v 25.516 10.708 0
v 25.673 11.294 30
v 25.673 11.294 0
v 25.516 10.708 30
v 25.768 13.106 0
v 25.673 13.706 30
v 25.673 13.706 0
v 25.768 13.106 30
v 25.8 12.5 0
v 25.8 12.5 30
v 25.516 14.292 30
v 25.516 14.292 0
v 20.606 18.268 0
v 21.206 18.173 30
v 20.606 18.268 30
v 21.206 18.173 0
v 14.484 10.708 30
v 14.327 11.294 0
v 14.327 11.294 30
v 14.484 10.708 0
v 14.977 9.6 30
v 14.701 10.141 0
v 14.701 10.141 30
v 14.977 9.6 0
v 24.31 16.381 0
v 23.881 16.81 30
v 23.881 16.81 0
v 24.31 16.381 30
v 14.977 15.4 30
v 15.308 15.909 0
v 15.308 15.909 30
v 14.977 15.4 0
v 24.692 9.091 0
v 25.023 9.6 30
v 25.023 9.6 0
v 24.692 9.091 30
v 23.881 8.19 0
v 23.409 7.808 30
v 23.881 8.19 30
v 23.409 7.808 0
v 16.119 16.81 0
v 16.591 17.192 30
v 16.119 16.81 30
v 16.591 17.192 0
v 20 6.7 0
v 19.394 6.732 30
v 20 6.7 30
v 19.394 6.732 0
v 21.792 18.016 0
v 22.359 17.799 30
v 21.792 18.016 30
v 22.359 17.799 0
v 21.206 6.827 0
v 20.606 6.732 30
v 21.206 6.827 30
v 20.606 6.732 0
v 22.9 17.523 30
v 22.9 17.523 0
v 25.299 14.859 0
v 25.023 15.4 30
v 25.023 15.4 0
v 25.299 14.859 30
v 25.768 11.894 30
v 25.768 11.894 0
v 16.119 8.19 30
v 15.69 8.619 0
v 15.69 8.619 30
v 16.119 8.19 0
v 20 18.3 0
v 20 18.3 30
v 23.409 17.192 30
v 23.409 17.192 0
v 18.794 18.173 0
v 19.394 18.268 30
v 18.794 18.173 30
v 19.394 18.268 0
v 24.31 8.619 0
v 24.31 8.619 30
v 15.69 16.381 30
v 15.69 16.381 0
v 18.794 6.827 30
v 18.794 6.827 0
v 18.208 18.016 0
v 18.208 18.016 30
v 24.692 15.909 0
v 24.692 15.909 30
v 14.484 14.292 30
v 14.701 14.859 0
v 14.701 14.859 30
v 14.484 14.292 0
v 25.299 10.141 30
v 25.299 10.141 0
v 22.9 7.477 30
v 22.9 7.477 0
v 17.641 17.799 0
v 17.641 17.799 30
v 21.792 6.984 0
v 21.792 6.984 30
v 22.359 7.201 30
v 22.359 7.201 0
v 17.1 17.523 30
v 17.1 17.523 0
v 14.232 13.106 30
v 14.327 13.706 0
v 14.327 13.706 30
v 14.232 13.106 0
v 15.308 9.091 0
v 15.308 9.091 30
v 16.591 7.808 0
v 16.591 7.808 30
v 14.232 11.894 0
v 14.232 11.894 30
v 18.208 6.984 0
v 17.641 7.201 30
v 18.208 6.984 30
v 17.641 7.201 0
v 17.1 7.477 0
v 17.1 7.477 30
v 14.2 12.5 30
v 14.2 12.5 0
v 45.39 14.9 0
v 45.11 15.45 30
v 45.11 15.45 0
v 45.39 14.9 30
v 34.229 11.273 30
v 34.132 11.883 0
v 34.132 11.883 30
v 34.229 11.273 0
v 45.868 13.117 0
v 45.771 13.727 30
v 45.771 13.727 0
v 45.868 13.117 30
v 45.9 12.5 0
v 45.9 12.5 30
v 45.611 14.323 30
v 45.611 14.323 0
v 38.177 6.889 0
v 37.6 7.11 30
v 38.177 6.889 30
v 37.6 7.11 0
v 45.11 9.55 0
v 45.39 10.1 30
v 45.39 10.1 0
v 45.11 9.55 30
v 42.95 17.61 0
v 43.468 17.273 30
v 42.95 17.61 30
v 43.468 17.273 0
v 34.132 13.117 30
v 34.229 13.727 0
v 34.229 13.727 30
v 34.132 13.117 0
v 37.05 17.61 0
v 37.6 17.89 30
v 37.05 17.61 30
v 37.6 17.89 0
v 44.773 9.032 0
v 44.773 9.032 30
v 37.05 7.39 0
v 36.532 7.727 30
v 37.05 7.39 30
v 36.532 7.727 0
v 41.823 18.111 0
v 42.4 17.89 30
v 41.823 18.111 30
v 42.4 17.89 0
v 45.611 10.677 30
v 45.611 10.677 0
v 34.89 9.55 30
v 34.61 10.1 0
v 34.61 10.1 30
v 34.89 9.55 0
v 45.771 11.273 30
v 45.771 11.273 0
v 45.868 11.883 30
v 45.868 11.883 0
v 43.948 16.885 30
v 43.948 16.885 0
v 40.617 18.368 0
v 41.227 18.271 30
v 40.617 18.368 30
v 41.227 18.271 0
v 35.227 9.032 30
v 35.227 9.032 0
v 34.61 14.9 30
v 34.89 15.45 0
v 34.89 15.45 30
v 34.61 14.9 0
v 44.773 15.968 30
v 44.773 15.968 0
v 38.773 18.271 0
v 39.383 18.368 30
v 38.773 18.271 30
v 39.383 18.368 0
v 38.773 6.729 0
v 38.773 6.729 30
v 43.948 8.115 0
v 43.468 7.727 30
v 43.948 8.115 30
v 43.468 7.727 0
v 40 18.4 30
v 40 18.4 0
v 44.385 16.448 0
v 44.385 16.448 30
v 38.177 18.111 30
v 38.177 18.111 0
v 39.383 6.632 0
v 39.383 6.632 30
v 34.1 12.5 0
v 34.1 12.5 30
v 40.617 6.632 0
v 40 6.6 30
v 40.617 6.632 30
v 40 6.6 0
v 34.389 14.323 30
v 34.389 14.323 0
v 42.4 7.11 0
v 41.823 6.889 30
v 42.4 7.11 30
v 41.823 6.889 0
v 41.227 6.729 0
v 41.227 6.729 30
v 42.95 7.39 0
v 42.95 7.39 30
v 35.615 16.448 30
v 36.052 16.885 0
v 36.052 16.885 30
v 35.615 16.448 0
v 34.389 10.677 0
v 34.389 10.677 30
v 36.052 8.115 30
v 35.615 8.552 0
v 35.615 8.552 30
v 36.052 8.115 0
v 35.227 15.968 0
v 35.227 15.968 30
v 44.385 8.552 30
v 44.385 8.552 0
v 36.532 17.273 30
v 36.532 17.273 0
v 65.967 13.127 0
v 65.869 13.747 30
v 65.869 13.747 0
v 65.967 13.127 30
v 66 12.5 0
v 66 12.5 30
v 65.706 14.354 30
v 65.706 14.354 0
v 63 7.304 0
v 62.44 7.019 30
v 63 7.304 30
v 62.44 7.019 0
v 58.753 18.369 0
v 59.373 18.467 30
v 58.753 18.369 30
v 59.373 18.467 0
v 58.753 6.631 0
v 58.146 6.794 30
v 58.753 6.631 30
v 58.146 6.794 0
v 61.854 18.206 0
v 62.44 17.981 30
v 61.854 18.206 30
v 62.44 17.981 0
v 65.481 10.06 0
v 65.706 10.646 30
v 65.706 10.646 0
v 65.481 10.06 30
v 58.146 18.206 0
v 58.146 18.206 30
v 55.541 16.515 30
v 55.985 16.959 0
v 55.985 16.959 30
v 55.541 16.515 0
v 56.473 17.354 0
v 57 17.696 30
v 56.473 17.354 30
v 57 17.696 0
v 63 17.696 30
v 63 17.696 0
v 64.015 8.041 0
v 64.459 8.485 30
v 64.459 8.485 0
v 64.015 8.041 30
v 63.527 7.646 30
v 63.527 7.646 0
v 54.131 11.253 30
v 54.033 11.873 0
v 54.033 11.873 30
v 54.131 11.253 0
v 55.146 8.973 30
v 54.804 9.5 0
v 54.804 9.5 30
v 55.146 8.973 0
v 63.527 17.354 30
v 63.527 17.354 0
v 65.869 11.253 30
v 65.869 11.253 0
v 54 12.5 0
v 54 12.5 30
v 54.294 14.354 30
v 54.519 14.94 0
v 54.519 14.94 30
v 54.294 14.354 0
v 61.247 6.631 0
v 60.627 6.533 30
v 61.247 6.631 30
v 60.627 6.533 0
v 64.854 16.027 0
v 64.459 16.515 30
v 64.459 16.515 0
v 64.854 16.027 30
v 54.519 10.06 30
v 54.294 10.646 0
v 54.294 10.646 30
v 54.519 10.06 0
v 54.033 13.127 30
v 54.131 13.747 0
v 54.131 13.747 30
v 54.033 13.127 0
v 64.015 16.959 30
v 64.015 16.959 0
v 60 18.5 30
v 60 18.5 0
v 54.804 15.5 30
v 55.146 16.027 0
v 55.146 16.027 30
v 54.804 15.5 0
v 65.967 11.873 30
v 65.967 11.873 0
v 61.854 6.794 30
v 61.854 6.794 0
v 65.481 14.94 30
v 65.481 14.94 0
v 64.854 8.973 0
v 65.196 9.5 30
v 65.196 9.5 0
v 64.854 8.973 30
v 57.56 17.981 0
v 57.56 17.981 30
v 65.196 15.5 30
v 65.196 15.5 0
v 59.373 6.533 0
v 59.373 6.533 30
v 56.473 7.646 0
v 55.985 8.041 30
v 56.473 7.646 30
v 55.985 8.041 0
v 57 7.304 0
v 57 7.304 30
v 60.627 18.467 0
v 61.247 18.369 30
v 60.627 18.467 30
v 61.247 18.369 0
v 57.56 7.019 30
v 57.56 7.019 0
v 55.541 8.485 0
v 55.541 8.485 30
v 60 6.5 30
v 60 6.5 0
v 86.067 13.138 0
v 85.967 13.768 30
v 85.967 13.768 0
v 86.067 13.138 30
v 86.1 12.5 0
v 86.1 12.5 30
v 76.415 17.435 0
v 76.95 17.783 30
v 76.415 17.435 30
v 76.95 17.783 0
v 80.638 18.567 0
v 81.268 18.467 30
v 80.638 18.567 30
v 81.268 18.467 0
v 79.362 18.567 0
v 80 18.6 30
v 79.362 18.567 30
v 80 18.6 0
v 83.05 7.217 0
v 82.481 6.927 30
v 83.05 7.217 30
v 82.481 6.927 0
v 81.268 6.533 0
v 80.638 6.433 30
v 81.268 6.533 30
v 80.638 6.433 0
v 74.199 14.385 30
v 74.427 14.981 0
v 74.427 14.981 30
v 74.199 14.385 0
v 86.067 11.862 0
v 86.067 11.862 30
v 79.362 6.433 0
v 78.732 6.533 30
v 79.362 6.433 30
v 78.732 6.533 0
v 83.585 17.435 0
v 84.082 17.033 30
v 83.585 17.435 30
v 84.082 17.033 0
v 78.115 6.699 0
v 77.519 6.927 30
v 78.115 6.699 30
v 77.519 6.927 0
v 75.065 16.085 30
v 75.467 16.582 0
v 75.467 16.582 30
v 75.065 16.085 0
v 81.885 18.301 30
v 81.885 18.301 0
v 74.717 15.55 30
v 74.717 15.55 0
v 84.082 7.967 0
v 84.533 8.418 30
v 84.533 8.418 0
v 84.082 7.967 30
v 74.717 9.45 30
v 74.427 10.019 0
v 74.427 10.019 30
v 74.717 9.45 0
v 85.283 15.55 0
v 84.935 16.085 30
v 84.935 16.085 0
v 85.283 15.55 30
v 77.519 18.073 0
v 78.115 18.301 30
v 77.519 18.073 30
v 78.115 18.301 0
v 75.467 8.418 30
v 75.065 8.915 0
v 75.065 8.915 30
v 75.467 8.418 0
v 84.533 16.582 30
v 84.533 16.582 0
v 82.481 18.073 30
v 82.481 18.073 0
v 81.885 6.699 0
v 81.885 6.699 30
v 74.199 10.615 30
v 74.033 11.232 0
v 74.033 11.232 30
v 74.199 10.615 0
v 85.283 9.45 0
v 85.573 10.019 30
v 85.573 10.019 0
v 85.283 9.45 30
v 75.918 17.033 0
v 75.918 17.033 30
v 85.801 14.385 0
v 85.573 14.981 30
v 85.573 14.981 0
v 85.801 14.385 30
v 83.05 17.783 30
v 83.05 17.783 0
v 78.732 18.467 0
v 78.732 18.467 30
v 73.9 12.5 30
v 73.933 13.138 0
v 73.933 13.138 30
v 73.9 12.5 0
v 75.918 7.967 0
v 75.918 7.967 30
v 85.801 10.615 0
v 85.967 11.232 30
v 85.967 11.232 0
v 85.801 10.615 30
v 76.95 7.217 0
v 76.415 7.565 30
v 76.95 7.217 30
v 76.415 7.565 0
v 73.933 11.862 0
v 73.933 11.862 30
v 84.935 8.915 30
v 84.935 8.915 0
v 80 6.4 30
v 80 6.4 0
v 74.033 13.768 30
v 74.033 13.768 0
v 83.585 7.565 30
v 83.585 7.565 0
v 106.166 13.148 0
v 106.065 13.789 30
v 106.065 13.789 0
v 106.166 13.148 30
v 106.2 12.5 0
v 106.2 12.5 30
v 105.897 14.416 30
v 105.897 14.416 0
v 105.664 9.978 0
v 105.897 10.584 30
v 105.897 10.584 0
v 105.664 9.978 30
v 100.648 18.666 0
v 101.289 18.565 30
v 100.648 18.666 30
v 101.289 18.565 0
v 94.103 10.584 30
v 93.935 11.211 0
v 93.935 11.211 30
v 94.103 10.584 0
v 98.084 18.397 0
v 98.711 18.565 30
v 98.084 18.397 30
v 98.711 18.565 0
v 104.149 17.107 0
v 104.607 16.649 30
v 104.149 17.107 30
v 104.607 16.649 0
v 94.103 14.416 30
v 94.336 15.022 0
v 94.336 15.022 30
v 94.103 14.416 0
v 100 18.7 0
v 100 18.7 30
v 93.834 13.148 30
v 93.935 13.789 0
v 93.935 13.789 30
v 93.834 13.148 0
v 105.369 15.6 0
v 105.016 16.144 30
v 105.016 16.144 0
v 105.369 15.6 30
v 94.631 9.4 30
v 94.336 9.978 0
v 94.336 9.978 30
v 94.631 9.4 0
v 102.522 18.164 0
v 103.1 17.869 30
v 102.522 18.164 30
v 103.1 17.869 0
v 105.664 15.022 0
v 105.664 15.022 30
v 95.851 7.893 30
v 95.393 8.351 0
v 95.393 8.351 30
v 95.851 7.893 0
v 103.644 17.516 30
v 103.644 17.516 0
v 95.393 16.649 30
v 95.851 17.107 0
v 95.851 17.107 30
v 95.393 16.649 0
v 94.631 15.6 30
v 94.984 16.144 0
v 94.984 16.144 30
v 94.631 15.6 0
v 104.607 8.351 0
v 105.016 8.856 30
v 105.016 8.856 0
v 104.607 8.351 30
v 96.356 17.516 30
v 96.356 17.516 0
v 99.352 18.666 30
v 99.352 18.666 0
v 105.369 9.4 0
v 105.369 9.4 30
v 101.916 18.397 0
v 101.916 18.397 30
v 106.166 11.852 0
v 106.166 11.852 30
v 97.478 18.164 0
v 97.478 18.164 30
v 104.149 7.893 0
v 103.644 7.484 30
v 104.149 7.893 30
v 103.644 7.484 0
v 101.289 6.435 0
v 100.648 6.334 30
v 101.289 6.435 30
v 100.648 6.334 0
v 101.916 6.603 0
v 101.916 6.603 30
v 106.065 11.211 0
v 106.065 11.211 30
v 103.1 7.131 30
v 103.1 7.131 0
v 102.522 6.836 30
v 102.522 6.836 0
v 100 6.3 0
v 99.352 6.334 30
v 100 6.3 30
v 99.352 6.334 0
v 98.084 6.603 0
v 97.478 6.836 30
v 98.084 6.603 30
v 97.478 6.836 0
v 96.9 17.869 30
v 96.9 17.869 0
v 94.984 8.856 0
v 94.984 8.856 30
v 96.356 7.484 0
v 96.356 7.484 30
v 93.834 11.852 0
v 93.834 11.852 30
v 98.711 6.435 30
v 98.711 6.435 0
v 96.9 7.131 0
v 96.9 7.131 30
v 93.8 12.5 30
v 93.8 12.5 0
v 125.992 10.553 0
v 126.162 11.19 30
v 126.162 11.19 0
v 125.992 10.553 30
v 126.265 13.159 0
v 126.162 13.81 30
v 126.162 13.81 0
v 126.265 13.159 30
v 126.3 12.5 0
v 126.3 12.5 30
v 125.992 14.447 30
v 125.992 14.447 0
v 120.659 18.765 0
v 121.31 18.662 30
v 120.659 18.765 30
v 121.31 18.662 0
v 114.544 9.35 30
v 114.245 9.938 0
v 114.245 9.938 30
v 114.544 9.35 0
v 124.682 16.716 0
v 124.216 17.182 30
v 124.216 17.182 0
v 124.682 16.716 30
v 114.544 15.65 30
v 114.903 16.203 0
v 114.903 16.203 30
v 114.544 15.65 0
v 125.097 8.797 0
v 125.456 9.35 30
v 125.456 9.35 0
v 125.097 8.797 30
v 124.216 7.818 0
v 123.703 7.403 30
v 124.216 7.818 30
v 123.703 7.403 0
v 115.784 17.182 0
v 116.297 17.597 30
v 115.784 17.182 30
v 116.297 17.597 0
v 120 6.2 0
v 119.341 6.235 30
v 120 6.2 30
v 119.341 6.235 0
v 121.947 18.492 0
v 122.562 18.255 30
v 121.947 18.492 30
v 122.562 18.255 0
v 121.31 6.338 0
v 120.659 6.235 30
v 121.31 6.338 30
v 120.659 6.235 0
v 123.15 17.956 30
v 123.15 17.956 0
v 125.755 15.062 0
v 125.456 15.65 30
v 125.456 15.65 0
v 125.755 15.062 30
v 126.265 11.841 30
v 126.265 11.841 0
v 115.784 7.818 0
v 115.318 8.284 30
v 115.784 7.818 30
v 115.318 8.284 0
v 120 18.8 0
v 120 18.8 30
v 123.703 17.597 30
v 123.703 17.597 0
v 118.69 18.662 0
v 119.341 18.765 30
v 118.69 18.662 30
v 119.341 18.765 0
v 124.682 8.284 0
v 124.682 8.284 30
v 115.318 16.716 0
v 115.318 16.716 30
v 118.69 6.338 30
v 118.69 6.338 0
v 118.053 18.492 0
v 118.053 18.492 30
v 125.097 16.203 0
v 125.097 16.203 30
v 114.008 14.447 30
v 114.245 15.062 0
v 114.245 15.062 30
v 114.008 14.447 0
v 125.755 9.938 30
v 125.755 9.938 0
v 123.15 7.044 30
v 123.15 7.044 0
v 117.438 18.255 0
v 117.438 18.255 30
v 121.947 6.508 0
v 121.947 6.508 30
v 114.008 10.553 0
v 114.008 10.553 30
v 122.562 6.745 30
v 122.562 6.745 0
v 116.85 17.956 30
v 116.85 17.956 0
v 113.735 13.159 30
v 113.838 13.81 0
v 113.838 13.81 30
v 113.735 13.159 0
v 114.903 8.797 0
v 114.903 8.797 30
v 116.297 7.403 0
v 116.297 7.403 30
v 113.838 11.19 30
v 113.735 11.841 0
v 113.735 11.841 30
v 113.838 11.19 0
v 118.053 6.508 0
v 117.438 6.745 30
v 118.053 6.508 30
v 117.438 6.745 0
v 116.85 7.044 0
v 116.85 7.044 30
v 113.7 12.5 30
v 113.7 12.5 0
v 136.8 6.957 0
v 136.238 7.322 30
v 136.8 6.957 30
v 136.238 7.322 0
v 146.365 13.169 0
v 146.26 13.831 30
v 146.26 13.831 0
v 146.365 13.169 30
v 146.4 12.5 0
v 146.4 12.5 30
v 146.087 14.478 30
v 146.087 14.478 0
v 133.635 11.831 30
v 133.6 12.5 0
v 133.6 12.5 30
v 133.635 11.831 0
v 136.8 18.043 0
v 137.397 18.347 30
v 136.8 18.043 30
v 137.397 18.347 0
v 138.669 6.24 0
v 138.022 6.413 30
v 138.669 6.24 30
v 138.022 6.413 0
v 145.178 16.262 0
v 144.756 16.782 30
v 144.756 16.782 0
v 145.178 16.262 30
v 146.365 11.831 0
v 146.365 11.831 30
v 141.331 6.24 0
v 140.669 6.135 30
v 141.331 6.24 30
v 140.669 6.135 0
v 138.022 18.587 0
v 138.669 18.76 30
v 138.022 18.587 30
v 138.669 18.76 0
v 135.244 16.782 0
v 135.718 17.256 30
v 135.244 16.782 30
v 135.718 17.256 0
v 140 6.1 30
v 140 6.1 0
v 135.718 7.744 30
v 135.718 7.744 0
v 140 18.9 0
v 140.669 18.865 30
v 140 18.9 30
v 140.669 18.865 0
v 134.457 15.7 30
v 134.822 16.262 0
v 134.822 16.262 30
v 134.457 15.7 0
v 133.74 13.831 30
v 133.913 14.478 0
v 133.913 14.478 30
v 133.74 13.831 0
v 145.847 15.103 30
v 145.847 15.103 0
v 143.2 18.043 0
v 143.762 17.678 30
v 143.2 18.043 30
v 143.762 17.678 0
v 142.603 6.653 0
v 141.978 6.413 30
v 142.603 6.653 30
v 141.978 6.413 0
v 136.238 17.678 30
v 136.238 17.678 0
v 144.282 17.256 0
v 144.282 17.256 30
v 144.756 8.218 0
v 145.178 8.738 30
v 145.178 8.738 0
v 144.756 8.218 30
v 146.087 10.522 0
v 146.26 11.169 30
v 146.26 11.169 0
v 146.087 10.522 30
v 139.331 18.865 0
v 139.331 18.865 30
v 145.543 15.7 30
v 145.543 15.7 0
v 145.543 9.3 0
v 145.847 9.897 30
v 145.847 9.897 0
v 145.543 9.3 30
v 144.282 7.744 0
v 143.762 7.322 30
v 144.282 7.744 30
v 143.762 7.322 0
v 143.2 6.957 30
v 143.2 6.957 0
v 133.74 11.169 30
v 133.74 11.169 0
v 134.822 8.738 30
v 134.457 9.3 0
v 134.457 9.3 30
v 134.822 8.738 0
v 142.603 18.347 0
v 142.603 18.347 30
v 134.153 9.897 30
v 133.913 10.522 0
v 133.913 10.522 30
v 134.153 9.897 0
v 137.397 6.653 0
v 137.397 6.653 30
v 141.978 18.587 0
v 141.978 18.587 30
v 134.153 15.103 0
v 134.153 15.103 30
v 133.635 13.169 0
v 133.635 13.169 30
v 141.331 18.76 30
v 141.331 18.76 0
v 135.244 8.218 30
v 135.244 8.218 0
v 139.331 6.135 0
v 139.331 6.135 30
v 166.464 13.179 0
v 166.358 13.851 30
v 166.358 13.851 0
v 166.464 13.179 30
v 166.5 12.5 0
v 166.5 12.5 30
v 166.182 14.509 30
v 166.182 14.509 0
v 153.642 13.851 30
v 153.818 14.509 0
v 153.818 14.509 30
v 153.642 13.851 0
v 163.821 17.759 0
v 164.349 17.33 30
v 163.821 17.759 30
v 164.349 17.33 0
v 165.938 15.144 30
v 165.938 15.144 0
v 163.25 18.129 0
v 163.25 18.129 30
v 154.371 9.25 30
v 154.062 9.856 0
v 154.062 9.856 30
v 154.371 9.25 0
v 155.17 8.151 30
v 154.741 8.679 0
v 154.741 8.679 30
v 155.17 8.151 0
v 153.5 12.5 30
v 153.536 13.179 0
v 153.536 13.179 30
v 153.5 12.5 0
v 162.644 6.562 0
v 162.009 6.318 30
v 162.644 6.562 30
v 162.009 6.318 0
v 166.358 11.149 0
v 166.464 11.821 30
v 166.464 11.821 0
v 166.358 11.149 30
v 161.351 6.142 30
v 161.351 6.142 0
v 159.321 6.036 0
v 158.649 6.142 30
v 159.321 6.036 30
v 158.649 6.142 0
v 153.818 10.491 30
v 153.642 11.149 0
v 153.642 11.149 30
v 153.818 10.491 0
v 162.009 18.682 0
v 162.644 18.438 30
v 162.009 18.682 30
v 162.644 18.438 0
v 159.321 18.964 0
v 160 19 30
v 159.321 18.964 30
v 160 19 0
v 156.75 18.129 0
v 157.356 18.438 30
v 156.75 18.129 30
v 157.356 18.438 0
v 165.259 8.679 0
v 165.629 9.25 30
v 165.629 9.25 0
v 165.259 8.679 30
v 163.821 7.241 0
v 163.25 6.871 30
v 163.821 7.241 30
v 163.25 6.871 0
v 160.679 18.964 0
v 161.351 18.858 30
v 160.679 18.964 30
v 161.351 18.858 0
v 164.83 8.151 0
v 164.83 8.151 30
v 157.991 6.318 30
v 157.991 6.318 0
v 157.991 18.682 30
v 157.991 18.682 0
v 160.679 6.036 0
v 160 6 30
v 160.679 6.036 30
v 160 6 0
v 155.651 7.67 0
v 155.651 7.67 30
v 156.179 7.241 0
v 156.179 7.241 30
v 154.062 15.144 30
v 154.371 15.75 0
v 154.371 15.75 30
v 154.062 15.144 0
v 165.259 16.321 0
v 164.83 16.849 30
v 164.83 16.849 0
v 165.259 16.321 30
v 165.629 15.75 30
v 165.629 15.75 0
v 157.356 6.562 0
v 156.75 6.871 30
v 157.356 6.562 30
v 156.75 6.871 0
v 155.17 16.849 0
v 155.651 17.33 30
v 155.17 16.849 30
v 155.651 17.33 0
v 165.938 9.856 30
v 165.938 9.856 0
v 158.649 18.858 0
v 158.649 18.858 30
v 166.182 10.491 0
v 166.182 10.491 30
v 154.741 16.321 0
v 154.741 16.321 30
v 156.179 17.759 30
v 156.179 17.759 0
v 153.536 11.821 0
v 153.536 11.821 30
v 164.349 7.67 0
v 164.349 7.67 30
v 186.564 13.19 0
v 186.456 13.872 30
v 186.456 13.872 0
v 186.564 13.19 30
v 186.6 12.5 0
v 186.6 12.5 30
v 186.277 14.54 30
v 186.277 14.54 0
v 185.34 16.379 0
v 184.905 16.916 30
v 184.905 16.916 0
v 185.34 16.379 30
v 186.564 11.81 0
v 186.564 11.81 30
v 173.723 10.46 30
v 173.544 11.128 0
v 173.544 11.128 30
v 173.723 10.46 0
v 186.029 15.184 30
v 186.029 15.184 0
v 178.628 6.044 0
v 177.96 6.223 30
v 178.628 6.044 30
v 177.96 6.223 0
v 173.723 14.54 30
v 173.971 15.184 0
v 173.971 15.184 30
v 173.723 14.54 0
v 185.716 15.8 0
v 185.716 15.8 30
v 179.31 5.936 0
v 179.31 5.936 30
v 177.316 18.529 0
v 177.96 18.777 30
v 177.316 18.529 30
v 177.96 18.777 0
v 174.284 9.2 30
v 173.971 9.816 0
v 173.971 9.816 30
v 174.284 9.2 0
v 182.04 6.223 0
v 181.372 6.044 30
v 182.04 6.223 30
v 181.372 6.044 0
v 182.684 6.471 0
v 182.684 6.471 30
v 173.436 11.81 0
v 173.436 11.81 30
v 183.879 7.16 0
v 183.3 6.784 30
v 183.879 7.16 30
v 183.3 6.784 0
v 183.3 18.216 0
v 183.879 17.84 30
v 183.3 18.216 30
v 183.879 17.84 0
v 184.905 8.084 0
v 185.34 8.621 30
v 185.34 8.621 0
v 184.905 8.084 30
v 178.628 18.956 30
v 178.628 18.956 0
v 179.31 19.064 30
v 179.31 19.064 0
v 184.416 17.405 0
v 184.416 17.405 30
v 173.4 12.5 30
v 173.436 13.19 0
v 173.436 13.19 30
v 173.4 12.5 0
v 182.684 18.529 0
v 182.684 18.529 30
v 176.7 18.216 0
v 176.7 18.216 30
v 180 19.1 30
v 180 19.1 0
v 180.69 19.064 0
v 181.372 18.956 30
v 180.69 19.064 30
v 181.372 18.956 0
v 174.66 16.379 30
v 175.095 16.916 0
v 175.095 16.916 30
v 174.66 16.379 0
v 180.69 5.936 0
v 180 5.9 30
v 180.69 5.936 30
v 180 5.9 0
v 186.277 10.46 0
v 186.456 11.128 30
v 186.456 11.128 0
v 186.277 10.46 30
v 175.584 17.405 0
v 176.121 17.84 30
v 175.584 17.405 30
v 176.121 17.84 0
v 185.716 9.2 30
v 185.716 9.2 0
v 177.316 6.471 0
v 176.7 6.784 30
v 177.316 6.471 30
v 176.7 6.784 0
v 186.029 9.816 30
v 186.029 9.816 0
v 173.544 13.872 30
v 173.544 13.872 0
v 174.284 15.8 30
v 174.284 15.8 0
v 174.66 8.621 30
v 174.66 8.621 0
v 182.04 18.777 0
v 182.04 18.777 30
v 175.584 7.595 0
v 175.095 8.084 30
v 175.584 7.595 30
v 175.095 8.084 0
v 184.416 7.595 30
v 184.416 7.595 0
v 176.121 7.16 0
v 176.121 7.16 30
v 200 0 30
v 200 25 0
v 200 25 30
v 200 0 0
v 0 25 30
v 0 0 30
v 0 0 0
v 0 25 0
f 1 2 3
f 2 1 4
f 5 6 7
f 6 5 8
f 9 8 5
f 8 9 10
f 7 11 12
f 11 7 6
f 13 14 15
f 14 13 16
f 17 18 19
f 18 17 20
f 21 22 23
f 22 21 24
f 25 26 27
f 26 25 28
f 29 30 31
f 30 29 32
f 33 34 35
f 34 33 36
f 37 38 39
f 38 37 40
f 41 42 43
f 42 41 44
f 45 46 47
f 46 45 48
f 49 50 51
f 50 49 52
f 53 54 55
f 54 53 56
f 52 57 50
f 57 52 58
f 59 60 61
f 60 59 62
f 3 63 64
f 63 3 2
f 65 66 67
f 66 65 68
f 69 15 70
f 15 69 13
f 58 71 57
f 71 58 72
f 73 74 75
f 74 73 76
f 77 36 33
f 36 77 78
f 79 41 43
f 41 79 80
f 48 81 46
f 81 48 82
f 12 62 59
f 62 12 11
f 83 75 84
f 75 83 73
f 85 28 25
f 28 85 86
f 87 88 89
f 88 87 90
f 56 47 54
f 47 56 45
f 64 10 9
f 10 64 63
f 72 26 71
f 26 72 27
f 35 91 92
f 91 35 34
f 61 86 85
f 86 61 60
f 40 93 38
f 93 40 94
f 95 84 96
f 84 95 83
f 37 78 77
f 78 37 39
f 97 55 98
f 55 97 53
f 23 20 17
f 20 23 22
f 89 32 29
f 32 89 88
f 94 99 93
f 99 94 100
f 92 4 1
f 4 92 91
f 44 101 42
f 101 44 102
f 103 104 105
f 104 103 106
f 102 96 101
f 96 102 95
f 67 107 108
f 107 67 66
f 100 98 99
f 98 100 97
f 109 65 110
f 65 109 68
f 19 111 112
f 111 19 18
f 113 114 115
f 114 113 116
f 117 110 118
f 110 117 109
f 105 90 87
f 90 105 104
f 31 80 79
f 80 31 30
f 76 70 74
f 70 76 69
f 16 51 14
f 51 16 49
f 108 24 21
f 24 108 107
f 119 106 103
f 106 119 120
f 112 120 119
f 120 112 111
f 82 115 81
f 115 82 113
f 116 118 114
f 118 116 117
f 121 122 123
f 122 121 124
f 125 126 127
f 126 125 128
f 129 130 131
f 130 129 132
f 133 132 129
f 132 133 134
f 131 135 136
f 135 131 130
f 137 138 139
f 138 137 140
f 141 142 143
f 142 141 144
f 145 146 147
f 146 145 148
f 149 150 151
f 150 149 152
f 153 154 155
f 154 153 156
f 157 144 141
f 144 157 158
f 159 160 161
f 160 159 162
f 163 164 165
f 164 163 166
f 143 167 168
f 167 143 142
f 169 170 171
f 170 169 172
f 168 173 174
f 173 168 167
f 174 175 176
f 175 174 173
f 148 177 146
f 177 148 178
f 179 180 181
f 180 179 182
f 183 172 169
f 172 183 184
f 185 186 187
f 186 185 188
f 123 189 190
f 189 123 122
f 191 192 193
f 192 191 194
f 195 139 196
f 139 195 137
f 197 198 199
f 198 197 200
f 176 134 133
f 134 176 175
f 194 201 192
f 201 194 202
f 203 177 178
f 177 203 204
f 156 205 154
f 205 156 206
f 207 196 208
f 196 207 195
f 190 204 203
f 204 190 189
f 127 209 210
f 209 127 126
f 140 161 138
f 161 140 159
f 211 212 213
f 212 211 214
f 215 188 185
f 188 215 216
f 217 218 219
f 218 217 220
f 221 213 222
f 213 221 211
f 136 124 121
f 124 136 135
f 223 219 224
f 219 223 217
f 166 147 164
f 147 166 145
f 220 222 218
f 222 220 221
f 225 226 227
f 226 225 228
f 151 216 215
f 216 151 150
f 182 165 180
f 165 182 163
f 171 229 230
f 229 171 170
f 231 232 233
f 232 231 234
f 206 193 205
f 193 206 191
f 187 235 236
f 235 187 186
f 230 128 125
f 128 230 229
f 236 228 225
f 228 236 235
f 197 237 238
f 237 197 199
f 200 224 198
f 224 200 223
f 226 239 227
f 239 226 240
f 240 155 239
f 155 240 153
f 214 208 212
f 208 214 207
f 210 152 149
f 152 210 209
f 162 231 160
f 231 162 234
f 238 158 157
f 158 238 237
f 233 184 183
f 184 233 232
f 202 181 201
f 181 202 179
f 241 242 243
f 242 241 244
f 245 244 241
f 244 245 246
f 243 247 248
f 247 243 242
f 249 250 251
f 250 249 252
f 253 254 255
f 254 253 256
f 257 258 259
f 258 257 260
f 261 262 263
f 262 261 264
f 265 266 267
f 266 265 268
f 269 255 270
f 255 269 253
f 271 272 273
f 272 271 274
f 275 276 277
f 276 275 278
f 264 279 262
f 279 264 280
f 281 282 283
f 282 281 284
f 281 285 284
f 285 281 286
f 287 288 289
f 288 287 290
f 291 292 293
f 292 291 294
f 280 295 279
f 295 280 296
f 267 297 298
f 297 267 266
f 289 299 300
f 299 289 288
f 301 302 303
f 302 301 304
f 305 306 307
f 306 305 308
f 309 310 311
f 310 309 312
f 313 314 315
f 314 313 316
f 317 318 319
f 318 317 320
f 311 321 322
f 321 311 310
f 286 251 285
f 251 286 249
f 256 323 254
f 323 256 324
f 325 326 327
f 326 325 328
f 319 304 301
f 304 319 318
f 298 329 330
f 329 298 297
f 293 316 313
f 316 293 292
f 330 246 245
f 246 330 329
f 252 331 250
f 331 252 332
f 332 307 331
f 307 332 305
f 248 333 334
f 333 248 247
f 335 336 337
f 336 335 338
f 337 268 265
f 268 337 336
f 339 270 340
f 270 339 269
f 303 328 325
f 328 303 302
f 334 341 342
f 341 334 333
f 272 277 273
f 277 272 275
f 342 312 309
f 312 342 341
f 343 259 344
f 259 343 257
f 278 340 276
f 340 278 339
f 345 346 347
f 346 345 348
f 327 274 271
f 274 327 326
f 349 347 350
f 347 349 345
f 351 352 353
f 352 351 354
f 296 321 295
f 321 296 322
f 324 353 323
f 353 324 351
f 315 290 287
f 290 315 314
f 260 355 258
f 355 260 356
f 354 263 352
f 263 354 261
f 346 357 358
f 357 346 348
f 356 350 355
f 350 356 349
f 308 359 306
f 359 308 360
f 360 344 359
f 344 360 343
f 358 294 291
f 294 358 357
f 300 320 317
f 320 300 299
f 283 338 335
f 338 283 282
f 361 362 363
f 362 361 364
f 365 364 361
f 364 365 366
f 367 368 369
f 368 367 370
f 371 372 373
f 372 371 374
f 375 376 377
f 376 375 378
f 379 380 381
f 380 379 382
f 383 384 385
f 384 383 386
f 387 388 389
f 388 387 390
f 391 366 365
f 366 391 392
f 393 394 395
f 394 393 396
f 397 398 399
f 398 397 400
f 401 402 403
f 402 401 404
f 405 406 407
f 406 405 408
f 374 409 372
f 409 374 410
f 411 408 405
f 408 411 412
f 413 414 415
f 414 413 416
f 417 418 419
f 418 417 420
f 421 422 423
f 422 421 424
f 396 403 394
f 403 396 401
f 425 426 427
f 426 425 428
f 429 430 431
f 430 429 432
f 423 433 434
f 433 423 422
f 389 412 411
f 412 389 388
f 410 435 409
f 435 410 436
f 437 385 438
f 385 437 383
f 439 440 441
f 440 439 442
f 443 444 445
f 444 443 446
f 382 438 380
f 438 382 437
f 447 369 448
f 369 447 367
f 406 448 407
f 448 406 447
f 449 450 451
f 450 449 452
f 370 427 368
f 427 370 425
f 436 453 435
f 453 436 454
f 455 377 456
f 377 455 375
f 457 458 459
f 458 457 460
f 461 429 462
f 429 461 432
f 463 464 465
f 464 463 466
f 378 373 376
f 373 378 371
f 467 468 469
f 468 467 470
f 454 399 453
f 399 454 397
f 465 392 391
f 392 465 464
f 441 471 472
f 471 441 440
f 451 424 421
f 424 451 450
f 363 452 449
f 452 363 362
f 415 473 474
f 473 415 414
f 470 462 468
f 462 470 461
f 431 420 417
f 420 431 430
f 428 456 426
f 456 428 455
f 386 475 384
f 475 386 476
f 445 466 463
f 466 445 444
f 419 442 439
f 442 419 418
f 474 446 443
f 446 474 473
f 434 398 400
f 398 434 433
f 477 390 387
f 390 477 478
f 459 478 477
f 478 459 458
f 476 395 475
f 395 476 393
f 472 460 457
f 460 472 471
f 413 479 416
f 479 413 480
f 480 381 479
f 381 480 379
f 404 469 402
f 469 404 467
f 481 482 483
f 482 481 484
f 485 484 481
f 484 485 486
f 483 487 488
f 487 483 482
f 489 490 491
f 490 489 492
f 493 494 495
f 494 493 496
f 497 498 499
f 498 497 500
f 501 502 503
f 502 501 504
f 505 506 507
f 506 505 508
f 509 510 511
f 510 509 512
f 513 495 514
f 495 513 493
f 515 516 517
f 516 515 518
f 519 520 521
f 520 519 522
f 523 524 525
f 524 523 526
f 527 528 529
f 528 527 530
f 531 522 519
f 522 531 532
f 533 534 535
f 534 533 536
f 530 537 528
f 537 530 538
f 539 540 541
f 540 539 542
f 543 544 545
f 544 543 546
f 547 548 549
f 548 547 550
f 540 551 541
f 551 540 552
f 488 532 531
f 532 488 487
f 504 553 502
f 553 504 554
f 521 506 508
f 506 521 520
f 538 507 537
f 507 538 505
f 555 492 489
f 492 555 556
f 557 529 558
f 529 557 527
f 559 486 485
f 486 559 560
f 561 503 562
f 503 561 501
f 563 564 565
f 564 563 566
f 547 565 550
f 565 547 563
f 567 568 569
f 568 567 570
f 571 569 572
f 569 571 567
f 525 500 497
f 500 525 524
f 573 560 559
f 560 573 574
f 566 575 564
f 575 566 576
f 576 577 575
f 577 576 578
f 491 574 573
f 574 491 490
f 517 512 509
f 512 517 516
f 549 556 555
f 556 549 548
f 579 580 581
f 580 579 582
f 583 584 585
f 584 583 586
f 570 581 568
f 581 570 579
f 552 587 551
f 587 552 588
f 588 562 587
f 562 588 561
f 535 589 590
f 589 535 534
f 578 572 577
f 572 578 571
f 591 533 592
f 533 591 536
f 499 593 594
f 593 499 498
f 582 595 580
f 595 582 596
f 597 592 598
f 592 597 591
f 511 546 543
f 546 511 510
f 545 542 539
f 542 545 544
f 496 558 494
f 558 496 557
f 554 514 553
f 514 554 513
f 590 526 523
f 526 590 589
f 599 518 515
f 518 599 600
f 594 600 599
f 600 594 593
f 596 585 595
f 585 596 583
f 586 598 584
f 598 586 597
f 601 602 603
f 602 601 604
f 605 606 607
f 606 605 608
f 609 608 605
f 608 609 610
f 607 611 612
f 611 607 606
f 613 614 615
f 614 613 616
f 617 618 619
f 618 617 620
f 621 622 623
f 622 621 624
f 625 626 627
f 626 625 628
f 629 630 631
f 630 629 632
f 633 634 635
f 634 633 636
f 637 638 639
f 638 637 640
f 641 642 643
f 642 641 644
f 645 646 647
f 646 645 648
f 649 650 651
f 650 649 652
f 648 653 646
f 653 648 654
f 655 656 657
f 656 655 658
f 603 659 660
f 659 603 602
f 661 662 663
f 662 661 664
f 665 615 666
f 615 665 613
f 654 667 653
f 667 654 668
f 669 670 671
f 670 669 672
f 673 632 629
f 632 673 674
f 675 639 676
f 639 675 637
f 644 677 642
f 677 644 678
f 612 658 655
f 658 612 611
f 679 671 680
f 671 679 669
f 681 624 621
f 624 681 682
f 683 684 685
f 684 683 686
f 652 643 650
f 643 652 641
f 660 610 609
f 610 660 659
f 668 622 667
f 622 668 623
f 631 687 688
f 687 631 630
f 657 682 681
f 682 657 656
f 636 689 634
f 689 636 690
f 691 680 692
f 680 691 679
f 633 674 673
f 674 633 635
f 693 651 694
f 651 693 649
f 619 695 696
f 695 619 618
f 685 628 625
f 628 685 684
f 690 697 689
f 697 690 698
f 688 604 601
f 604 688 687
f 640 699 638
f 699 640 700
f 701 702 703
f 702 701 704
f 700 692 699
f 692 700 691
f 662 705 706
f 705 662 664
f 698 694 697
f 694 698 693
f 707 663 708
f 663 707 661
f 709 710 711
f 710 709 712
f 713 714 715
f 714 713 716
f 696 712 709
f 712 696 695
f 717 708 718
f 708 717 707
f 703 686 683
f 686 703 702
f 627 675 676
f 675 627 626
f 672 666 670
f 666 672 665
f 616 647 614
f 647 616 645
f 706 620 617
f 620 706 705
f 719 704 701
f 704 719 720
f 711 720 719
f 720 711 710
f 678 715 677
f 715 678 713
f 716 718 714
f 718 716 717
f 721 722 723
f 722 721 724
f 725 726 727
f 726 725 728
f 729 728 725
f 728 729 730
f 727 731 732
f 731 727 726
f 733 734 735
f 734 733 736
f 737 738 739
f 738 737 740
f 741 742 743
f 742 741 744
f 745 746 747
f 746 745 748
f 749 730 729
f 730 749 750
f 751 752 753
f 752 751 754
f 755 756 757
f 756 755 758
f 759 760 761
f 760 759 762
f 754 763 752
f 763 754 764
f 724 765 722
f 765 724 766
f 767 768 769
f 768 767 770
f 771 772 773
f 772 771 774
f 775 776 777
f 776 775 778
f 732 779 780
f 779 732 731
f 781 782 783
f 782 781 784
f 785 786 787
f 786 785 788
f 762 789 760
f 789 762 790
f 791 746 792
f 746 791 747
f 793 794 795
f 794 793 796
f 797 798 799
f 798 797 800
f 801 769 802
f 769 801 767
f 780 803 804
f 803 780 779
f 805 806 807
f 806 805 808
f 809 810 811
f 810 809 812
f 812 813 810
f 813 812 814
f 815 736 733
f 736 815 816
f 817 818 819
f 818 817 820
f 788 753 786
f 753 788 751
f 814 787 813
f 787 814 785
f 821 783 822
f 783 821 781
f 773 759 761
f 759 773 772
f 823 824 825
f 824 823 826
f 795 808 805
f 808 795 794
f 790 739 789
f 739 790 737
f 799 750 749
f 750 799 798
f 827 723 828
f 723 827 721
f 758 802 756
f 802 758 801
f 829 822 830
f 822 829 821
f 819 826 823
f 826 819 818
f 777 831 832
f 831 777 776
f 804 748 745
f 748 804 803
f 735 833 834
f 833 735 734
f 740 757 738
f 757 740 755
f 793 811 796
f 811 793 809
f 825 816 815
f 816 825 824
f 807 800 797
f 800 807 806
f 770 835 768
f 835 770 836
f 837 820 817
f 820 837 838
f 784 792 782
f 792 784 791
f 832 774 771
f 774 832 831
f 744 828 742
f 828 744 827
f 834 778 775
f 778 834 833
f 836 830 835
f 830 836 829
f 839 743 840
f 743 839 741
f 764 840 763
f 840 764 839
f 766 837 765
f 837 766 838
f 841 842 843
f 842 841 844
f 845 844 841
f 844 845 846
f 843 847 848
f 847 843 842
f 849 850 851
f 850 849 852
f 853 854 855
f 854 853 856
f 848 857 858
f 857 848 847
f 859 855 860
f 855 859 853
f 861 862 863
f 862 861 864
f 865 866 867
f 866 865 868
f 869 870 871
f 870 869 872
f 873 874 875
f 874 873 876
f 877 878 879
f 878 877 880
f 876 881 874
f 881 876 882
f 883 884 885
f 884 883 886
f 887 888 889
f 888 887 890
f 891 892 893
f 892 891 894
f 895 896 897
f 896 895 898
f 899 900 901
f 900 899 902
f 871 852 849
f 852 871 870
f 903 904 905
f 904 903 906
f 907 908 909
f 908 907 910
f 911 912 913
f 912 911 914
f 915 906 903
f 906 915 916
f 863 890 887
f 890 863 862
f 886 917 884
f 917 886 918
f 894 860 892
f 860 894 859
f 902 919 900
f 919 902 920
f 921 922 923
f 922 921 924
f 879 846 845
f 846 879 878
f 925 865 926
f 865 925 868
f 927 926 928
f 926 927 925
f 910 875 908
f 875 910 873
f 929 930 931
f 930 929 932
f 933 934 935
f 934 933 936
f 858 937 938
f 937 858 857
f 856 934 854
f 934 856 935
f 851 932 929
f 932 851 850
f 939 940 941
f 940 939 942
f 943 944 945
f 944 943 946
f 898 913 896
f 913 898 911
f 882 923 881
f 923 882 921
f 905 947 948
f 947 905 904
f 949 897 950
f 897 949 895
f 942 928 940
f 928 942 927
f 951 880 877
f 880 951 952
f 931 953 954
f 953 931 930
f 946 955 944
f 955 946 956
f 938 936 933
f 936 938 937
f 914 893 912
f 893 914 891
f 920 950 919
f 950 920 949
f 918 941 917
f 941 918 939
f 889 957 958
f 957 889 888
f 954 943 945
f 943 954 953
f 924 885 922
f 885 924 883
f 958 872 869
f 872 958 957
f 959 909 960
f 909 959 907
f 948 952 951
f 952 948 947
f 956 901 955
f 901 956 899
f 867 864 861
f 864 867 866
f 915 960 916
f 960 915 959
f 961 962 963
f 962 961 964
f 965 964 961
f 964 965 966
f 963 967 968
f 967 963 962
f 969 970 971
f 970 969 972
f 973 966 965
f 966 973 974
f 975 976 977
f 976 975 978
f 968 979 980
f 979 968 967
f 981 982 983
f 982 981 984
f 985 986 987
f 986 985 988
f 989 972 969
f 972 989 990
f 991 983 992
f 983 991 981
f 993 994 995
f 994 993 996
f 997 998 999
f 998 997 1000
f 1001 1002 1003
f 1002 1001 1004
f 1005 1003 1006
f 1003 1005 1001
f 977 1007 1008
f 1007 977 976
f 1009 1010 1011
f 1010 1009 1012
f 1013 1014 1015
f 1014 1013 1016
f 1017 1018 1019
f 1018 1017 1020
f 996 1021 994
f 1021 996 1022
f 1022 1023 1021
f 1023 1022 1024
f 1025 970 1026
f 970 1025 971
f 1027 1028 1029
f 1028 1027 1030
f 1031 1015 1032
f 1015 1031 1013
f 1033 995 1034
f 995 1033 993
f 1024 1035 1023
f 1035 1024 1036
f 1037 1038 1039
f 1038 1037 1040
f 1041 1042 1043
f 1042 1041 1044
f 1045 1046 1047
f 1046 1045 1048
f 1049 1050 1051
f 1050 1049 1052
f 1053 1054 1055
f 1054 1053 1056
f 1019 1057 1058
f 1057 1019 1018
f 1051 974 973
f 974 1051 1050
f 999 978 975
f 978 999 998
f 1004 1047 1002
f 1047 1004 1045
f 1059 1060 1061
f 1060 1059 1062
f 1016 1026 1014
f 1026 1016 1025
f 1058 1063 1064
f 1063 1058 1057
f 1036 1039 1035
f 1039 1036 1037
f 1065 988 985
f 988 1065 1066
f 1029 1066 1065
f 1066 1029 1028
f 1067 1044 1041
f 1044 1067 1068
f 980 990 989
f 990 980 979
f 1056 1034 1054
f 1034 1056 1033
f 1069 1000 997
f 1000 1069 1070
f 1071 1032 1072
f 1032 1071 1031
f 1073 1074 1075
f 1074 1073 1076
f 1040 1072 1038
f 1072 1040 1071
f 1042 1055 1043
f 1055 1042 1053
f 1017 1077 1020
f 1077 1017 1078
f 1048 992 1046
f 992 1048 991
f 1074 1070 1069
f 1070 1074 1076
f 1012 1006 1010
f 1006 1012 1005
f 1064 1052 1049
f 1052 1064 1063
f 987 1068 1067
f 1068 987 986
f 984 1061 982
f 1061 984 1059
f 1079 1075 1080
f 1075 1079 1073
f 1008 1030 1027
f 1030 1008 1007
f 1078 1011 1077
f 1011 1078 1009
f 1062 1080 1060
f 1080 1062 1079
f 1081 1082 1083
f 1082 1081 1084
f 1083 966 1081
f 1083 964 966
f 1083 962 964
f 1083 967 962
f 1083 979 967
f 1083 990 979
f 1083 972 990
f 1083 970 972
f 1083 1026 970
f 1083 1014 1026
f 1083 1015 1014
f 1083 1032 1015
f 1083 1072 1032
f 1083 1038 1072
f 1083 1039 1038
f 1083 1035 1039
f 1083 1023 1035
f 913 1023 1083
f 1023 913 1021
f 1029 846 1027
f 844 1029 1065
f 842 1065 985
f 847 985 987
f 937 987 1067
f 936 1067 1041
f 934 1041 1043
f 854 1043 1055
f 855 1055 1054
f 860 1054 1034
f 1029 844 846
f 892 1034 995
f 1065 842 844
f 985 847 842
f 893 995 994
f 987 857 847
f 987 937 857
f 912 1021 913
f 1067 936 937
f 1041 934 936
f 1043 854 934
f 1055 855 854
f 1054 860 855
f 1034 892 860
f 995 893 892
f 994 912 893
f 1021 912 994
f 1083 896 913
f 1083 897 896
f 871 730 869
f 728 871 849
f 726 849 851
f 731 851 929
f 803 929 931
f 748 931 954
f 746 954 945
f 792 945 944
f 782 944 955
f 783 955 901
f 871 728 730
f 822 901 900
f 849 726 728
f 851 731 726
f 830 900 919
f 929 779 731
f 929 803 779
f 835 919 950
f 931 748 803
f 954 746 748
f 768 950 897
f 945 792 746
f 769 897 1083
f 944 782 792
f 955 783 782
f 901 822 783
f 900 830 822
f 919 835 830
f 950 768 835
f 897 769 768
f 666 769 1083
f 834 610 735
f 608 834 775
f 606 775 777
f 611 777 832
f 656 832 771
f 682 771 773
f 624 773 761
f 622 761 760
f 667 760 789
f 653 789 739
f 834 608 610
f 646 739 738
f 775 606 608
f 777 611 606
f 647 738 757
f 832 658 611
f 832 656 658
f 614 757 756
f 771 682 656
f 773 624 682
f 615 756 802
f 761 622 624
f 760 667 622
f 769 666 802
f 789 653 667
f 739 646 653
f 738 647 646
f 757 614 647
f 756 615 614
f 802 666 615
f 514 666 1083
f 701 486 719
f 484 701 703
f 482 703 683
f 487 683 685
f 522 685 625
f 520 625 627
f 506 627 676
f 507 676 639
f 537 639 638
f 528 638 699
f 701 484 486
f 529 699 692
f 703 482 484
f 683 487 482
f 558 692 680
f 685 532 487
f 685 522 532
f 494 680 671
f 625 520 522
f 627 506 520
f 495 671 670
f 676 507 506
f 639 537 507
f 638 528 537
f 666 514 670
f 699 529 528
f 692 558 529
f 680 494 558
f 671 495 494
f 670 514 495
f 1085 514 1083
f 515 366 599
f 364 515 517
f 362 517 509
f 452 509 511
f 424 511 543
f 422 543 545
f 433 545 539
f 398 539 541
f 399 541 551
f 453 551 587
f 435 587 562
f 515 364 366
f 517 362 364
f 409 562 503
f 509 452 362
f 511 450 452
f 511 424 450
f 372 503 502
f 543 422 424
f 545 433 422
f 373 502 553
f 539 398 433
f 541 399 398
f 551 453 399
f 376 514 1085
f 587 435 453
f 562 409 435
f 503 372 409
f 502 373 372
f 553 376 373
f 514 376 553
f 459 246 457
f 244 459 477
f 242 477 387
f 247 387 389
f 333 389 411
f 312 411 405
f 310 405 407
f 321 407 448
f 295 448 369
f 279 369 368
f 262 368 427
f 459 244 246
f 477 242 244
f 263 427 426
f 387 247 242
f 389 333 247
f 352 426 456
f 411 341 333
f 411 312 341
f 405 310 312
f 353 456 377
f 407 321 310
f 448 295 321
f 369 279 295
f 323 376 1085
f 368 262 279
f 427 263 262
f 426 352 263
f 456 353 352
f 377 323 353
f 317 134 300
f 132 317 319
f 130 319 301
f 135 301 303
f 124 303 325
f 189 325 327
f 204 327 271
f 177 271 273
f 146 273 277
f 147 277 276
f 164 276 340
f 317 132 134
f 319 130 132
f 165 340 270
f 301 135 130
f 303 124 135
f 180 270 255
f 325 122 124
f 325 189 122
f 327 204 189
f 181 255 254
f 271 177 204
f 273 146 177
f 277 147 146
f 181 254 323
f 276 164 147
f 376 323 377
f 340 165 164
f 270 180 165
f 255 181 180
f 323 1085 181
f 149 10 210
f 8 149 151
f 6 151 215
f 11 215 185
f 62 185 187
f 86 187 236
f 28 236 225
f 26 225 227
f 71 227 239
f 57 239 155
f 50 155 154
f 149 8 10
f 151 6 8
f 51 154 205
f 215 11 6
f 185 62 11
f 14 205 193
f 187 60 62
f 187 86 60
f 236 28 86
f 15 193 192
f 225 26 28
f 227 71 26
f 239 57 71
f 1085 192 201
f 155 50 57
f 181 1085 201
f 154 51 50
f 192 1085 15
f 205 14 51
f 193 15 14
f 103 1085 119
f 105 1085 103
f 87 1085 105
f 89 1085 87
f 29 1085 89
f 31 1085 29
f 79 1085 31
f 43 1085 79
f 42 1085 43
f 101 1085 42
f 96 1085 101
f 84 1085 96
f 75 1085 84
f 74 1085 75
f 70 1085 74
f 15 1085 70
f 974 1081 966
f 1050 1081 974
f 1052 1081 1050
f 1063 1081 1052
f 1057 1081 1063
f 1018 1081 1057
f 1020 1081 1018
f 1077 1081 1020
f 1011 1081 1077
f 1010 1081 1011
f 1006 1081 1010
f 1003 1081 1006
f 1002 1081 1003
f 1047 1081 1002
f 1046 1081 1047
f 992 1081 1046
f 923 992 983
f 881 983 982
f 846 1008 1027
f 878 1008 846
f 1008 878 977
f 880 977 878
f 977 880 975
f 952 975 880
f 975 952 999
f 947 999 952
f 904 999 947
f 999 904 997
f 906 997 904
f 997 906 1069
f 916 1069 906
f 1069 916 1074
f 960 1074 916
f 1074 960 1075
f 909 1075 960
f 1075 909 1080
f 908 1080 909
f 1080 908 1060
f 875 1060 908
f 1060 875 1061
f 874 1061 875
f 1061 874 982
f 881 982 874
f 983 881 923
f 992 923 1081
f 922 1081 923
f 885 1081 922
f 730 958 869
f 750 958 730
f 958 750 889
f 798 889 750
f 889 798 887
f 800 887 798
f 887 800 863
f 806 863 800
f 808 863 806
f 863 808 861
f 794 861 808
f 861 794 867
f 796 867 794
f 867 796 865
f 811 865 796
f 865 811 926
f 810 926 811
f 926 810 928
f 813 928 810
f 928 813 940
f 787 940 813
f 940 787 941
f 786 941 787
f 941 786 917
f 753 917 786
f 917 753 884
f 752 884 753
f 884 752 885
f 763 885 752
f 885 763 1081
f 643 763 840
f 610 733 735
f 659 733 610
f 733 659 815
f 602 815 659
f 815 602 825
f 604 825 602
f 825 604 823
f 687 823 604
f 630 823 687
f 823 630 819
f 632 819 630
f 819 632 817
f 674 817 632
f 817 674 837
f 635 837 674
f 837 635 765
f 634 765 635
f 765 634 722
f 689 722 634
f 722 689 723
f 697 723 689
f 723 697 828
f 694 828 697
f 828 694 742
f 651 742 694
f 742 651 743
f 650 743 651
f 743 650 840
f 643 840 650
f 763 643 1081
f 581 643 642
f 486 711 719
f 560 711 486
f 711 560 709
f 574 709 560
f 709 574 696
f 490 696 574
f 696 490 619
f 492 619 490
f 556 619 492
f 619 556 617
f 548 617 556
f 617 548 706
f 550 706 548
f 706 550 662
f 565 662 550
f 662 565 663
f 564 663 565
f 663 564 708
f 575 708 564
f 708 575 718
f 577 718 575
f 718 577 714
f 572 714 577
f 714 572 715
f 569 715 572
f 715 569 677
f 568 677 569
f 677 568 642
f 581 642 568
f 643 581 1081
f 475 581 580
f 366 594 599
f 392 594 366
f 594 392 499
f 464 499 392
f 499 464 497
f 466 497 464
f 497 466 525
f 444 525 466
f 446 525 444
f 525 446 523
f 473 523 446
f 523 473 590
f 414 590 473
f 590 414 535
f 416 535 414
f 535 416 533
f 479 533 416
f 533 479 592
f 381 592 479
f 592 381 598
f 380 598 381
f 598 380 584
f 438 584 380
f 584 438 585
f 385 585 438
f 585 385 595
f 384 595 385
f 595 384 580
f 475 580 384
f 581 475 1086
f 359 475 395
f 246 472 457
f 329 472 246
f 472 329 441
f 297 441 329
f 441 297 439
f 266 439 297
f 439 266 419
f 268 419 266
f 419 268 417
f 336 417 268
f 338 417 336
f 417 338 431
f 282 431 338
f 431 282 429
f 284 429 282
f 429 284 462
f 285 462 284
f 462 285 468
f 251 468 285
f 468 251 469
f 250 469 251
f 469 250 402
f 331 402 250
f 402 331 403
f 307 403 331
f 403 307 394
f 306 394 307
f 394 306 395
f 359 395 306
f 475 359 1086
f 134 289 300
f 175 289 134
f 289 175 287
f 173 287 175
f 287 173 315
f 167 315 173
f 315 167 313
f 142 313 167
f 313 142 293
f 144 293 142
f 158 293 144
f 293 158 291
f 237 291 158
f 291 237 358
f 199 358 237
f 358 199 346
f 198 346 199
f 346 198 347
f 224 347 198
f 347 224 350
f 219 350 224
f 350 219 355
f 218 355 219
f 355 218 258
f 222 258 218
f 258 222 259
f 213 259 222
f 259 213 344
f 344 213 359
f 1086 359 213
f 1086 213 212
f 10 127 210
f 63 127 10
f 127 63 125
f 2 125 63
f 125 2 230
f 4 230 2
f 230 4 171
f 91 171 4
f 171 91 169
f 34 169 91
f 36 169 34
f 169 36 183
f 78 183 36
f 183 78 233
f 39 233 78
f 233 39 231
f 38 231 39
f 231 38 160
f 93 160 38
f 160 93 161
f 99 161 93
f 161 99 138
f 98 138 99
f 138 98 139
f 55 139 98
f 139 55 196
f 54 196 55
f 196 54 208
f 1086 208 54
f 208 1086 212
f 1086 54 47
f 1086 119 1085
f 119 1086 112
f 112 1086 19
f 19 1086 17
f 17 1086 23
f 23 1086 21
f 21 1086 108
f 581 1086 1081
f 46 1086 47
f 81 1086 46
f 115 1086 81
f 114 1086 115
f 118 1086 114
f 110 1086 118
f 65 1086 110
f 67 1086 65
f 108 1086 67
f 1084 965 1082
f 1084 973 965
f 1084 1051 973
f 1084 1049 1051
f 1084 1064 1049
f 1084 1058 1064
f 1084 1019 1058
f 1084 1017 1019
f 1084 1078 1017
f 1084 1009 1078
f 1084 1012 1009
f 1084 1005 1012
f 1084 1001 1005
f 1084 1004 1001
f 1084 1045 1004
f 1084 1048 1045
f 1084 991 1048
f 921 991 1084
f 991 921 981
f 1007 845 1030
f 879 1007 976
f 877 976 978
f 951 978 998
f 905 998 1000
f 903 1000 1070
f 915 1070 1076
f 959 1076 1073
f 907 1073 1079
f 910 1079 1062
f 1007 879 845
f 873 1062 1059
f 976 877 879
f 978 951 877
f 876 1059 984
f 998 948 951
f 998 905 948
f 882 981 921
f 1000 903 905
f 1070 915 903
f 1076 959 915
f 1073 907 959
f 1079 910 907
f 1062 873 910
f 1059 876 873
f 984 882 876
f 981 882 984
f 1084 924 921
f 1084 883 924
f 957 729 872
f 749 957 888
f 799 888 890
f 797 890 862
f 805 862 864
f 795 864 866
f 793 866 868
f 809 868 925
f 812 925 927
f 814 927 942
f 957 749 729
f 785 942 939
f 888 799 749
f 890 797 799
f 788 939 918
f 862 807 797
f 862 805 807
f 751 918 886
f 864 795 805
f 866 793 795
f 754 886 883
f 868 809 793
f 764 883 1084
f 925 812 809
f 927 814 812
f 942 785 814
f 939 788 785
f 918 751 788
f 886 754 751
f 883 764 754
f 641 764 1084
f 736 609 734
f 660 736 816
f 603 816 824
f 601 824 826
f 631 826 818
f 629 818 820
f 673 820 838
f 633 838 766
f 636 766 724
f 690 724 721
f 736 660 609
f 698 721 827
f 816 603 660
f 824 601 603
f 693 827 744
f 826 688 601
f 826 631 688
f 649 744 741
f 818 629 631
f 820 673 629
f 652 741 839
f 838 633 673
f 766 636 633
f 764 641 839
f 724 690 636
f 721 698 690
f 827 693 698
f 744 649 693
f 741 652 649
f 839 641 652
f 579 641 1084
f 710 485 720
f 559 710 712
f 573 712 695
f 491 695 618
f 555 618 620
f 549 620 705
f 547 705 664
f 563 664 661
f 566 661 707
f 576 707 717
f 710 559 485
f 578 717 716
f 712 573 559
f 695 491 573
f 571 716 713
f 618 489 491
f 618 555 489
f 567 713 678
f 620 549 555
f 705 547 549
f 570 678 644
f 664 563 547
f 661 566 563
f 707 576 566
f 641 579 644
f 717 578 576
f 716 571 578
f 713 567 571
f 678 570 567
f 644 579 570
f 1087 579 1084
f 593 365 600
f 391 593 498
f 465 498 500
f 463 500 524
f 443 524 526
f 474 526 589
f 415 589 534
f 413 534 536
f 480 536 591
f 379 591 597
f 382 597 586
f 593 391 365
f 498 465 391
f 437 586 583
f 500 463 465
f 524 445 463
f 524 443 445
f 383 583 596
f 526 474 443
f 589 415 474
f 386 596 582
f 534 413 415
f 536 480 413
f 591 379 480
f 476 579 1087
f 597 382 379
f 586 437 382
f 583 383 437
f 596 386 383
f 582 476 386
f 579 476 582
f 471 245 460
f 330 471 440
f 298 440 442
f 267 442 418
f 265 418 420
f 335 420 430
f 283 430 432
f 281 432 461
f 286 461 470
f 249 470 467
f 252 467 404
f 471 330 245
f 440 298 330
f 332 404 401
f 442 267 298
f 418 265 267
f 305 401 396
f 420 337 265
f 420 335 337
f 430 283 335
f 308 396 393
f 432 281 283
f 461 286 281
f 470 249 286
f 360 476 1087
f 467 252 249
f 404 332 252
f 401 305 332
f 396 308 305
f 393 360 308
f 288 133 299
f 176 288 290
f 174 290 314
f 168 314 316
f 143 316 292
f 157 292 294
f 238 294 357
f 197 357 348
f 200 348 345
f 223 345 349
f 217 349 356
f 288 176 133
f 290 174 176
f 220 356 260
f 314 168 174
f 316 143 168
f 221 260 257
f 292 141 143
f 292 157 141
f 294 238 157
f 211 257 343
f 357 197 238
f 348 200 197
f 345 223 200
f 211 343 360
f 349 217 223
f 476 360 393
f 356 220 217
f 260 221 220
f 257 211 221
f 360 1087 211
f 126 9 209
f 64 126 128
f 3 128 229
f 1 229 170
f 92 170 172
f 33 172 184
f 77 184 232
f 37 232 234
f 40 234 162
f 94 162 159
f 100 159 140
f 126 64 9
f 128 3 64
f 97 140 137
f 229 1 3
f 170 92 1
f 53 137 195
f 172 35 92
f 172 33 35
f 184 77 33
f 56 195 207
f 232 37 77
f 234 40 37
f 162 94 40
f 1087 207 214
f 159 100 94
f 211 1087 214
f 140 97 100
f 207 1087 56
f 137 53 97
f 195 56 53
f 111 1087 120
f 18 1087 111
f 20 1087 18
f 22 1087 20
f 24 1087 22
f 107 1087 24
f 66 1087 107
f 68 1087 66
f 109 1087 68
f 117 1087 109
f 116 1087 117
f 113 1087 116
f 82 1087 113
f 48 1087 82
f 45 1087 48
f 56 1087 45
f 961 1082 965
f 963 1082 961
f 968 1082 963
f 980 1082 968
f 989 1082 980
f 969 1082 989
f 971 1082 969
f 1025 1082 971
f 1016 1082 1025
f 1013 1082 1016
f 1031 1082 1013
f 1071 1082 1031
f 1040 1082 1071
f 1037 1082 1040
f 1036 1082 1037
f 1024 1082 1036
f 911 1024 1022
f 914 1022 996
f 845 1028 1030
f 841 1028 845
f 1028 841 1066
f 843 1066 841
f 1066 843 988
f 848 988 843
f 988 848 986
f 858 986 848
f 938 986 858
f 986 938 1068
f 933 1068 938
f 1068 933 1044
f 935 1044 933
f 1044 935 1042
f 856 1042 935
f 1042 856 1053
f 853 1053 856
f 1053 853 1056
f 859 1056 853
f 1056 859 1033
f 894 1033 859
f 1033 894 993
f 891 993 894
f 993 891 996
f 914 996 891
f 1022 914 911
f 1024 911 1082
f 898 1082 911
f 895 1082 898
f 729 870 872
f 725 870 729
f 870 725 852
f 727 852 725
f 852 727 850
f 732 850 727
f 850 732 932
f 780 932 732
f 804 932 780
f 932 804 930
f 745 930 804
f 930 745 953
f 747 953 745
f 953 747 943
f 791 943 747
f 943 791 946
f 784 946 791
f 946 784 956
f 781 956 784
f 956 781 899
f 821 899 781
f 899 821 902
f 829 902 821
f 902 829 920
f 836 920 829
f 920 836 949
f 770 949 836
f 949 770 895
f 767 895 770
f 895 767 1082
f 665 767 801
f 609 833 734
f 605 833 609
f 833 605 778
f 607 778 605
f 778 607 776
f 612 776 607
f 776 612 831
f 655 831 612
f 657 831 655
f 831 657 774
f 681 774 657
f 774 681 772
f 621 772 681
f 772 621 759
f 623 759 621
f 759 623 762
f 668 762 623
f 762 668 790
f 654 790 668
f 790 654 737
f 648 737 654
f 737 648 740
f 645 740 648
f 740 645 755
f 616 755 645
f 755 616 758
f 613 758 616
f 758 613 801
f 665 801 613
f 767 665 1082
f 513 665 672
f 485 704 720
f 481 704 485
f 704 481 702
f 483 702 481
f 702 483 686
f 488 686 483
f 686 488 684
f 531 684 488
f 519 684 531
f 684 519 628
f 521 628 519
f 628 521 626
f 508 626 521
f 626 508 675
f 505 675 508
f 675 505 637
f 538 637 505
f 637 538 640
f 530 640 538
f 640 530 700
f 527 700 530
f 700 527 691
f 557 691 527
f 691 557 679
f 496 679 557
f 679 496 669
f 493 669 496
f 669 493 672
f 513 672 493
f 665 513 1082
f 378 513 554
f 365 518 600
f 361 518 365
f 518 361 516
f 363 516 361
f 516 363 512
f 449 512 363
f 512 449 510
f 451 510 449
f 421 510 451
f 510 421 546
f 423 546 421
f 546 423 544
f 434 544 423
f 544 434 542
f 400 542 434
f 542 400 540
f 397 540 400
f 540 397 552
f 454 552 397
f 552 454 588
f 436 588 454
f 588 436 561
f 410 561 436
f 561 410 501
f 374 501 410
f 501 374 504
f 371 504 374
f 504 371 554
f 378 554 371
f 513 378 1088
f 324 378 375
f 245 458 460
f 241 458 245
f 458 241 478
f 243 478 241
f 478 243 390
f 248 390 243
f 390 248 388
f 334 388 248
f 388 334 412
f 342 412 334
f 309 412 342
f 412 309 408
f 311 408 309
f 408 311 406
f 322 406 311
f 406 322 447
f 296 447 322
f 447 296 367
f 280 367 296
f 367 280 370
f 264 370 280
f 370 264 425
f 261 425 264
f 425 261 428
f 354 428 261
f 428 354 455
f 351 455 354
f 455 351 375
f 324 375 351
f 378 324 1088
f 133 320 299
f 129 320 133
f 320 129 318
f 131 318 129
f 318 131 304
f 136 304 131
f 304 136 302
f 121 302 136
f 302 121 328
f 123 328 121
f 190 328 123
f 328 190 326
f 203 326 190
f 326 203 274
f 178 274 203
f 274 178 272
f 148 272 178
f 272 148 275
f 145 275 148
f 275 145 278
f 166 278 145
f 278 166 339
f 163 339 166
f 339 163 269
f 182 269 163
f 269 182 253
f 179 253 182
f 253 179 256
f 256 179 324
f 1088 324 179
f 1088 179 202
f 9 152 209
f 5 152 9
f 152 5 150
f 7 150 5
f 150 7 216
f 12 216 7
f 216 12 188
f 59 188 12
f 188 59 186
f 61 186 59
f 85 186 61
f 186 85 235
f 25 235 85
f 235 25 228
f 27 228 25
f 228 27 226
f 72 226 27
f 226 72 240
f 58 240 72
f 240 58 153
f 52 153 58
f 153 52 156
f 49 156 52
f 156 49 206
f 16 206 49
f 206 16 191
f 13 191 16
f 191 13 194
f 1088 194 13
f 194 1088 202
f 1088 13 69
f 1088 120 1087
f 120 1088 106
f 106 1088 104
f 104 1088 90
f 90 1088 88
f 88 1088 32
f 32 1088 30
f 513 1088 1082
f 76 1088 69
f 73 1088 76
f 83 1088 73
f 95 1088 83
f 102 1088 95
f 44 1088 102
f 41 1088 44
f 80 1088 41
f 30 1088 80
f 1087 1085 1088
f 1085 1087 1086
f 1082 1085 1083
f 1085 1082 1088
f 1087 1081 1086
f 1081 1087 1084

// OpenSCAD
$fn=60;
difference() {
    cube([200, 25, 30]);
    for(i=[0:8])
       translate([20+20*i, 12.5, 0])
        cylinder(r=5.8+.1*i, h=100, center=true);
}
